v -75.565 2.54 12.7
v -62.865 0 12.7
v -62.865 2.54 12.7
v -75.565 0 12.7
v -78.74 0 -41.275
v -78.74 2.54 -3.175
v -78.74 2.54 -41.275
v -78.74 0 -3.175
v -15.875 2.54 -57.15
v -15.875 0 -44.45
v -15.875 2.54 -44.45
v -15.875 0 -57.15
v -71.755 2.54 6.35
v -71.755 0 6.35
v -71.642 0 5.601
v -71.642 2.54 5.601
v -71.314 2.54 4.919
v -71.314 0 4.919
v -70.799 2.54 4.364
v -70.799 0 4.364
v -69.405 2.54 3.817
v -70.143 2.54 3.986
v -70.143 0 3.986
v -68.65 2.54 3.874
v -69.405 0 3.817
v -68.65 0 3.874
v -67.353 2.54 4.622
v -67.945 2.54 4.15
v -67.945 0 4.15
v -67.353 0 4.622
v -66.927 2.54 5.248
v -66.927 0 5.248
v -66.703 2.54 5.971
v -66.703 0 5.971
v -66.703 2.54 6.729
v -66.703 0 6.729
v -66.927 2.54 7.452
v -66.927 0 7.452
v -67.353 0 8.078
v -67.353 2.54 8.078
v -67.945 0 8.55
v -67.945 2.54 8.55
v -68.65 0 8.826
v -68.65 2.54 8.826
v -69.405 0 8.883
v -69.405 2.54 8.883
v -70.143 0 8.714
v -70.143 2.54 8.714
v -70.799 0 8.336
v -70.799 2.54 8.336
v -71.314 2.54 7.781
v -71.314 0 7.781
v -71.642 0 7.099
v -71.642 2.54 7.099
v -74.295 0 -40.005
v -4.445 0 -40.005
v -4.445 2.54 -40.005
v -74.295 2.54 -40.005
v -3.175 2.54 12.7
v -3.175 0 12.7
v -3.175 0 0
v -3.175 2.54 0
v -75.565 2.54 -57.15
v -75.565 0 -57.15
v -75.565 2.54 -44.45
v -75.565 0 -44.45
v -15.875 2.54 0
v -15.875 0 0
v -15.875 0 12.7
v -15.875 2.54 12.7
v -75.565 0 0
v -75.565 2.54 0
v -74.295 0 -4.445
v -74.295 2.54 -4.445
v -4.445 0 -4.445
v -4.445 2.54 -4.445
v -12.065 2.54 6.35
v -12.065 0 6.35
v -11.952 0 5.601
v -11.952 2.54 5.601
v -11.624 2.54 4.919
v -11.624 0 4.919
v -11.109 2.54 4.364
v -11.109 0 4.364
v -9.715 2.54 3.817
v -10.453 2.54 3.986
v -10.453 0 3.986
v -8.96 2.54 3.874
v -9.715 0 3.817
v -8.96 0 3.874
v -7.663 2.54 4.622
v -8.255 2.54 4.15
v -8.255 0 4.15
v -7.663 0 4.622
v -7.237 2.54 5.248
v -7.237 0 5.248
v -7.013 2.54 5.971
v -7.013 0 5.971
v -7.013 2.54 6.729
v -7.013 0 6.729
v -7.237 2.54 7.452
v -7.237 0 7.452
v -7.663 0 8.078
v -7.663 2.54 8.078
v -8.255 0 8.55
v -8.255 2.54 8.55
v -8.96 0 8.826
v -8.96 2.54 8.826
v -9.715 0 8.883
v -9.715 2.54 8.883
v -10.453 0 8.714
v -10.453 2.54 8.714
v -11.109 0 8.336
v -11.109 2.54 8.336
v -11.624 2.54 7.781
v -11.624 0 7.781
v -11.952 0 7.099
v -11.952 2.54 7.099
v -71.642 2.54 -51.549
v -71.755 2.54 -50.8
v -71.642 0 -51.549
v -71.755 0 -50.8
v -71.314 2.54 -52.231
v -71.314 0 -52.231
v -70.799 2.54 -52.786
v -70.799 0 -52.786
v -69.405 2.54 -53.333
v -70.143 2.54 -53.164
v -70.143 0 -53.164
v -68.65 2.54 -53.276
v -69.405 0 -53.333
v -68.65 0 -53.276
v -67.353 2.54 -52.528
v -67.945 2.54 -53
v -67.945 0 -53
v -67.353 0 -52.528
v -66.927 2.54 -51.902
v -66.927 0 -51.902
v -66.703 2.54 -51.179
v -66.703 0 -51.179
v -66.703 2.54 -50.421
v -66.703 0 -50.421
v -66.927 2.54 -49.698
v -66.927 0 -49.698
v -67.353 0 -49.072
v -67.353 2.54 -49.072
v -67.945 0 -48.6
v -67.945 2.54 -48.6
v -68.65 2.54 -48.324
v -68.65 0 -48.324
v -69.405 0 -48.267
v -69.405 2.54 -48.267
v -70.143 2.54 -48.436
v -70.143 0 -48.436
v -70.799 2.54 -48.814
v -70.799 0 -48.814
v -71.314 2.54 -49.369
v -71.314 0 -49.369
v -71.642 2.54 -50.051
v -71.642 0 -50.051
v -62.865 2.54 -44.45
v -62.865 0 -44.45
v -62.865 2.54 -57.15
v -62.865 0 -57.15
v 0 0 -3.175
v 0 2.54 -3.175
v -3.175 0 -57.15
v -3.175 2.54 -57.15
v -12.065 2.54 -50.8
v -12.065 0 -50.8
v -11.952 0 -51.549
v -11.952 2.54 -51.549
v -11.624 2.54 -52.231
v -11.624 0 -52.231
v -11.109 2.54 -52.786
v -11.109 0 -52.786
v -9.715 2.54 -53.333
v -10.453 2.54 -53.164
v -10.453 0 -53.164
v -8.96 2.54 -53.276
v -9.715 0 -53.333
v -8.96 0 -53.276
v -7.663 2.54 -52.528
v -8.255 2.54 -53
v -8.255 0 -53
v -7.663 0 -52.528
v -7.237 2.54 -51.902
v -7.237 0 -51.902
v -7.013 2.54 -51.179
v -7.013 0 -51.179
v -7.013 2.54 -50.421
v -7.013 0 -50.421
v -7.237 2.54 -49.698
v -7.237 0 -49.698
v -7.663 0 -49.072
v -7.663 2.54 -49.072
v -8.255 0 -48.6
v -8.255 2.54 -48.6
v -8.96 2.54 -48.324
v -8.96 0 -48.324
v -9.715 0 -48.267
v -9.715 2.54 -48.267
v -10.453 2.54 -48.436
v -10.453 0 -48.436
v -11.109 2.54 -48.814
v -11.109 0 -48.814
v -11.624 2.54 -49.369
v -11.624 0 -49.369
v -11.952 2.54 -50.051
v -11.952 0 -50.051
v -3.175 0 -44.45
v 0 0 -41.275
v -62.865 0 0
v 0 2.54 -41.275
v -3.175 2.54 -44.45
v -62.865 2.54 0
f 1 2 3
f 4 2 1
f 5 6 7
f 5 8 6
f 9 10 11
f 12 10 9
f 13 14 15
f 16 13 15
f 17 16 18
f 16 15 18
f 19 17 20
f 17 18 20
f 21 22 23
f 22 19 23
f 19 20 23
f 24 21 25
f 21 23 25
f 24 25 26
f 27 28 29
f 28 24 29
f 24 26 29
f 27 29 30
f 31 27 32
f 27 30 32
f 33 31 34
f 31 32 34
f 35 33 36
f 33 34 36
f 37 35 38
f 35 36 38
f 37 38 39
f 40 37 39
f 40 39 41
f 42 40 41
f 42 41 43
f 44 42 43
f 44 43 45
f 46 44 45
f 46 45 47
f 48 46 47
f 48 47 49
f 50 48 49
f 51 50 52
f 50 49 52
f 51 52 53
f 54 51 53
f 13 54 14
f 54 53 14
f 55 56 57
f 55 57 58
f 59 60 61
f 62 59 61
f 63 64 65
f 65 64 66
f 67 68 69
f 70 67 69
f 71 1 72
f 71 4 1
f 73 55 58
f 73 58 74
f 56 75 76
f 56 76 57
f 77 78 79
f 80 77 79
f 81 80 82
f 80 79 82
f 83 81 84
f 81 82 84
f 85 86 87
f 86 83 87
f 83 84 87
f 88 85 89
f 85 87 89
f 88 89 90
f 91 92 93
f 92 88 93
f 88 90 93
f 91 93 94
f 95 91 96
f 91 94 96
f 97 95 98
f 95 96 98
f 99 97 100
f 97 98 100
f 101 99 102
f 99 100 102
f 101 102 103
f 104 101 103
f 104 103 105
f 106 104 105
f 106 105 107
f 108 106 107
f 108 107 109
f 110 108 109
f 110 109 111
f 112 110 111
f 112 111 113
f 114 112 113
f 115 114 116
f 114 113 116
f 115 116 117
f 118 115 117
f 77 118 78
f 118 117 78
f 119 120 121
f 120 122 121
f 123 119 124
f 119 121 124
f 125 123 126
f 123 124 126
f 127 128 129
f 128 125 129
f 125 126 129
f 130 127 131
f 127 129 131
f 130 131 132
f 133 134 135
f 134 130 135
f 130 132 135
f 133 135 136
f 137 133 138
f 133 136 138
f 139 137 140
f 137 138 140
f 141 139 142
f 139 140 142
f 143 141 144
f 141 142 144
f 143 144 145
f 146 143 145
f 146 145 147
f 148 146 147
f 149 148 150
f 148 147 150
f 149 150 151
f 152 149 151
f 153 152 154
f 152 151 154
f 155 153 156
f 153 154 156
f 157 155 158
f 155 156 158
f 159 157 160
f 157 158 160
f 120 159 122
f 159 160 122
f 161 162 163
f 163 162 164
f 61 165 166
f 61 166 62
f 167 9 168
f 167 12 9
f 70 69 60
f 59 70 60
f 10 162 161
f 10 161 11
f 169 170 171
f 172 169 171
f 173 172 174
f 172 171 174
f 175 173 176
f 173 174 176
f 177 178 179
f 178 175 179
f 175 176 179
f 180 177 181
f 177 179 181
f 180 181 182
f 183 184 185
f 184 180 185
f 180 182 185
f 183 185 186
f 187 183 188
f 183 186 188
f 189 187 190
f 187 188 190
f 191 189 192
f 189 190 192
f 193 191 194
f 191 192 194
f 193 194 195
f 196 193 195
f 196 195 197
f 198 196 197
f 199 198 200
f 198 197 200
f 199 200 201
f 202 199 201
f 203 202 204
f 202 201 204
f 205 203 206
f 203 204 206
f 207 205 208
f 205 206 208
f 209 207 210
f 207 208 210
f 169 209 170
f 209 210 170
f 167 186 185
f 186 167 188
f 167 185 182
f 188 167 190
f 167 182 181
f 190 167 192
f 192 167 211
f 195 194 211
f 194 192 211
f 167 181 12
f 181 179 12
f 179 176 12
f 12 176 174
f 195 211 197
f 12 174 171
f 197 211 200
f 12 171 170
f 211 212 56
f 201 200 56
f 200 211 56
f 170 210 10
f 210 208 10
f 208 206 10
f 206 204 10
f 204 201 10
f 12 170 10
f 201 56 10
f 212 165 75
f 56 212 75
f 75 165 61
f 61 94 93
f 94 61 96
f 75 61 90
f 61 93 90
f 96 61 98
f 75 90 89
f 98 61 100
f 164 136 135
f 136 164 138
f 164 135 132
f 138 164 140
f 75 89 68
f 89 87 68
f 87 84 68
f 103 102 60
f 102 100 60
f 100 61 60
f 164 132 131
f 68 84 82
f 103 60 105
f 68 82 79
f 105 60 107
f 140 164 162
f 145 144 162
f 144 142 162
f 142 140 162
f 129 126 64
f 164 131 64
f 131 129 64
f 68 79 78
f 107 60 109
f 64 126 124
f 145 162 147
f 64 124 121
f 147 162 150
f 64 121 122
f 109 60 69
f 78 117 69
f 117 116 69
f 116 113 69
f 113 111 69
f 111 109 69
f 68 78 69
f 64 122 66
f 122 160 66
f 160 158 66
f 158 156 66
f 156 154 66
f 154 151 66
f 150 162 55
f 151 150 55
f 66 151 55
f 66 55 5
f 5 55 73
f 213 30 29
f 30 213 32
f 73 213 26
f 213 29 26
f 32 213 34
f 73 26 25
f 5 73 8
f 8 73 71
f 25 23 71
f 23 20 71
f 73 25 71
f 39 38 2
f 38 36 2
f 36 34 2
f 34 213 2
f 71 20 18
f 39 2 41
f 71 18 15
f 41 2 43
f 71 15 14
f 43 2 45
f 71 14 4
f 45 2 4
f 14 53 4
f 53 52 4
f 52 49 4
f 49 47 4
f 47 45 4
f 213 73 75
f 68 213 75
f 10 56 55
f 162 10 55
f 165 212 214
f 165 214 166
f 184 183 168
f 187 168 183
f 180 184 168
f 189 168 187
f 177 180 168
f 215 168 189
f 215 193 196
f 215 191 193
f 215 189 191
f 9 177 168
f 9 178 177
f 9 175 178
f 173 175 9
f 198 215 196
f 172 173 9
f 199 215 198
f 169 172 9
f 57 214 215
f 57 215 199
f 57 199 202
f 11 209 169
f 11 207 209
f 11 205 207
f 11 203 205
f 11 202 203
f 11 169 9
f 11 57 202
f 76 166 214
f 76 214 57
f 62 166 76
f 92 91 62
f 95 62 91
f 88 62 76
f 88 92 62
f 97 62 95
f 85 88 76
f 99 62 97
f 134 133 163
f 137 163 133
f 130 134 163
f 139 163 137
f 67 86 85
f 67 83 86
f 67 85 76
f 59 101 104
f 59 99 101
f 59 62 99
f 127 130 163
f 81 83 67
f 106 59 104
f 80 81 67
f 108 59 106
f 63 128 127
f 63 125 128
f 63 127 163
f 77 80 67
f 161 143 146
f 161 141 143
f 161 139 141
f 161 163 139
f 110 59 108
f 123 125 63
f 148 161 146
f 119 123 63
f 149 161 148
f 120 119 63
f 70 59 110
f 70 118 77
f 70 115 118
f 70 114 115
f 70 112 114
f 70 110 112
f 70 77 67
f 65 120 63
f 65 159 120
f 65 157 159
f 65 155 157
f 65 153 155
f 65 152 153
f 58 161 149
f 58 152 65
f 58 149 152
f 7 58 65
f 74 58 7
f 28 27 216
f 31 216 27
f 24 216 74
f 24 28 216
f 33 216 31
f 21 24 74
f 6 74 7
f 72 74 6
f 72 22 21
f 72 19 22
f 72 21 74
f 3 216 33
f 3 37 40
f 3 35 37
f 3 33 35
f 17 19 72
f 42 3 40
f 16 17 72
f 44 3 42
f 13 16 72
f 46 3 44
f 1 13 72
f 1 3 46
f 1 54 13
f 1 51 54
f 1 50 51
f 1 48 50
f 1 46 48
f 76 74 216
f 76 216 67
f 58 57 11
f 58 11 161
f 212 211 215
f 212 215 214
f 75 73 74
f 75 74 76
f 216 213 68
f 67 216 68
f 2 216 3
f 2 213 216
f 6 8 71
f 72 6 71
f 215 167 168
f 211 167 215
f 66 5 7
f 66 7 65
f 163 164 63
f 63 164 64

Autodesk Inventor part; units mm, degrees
ref_plane "YZ Plane" through (0, 0, 0) normal (1, 0, 0) x (0, 1, 0)
ref_plane "XZ Plane" through (0, 0, 0) normal (0, 1, 0) x (-1, 0, 0)
ref_plane "XY Plane" through (0, 0, 0) normal (0, 0, 1) x (1, 0, 0)
sketch "Sketch1" plane through (0, 0, 0) normal (0, 1, 0) x (-1, 0, 0)
  line L0 (78.74, -3.175) -> (78.74, -41.275)
  line L1 (0, -41.275) -> (0, -3.175)
  line L2 (74.295, -4.445) -> (4.445, -4.445)
  line L3 (4.445, -4.445) -> (4.445, -40.005)
  line L4 (4.445, -40.005) -> (74.295, -40.005)
  line L5 (74.295, -40.005) -> (74.295, -4.445)
  line L6 (78.74, -3.175) -> (75.565, 0)
  line L7 (78.74, -41.275) -> (75.565, -44.45)
  line L8 (3.175, -44.45) -> (0, -41.275)
  line L9 (0, -3.175) -> (3.175, 0)
  line L10 (62.865, 0) -> (62.865, 12.7)
  line L11 (62.865, 12.7) -> (75.565, 12.7)
  line L12 (75.565, 12.7) -> (75.565, 0)
  line L13 (62.865, -44.45) -> (62.865, -57.15)
  line L14 (62.865, -57.15) -> (75.565, -57.15)
  line L15 (75.565, -57.15) -> (75.565, -44.45)
  line L16 (15.875, -44.45) -> (15.875, -57.15)
  line L17 (15.875, -57.15) -> (3.175, -57.15)
  line L18 (3.175, -57.15) -> (3.175, -44.45)
  line L19 (15.875, 0) -> (15.875, 12.7)
  line L20 (15.875, 12.7) -> (3.175, 12.7)
  line L21 (3.175, 12.7) -> (3.175, 0)
  line L22 (62.865, 0) -> (15.875, 0)
  line L23 (62.865, -44.45) -> (15.875, -44.45)
  circle A0 centre (69.215, 6.35) radius 2.54
  circle A1 centre (9.525, -50.8) radius 2.54
  circle A2 centre (9.525, 6.35) radius 2.54
  circle A3 centre (69.215, -50.8) radius 2.54
extrude "Extrusion1" add sketch "Sketch1" along normal blind 2.54
properties part number "Spark MAX Holder Bottom"
